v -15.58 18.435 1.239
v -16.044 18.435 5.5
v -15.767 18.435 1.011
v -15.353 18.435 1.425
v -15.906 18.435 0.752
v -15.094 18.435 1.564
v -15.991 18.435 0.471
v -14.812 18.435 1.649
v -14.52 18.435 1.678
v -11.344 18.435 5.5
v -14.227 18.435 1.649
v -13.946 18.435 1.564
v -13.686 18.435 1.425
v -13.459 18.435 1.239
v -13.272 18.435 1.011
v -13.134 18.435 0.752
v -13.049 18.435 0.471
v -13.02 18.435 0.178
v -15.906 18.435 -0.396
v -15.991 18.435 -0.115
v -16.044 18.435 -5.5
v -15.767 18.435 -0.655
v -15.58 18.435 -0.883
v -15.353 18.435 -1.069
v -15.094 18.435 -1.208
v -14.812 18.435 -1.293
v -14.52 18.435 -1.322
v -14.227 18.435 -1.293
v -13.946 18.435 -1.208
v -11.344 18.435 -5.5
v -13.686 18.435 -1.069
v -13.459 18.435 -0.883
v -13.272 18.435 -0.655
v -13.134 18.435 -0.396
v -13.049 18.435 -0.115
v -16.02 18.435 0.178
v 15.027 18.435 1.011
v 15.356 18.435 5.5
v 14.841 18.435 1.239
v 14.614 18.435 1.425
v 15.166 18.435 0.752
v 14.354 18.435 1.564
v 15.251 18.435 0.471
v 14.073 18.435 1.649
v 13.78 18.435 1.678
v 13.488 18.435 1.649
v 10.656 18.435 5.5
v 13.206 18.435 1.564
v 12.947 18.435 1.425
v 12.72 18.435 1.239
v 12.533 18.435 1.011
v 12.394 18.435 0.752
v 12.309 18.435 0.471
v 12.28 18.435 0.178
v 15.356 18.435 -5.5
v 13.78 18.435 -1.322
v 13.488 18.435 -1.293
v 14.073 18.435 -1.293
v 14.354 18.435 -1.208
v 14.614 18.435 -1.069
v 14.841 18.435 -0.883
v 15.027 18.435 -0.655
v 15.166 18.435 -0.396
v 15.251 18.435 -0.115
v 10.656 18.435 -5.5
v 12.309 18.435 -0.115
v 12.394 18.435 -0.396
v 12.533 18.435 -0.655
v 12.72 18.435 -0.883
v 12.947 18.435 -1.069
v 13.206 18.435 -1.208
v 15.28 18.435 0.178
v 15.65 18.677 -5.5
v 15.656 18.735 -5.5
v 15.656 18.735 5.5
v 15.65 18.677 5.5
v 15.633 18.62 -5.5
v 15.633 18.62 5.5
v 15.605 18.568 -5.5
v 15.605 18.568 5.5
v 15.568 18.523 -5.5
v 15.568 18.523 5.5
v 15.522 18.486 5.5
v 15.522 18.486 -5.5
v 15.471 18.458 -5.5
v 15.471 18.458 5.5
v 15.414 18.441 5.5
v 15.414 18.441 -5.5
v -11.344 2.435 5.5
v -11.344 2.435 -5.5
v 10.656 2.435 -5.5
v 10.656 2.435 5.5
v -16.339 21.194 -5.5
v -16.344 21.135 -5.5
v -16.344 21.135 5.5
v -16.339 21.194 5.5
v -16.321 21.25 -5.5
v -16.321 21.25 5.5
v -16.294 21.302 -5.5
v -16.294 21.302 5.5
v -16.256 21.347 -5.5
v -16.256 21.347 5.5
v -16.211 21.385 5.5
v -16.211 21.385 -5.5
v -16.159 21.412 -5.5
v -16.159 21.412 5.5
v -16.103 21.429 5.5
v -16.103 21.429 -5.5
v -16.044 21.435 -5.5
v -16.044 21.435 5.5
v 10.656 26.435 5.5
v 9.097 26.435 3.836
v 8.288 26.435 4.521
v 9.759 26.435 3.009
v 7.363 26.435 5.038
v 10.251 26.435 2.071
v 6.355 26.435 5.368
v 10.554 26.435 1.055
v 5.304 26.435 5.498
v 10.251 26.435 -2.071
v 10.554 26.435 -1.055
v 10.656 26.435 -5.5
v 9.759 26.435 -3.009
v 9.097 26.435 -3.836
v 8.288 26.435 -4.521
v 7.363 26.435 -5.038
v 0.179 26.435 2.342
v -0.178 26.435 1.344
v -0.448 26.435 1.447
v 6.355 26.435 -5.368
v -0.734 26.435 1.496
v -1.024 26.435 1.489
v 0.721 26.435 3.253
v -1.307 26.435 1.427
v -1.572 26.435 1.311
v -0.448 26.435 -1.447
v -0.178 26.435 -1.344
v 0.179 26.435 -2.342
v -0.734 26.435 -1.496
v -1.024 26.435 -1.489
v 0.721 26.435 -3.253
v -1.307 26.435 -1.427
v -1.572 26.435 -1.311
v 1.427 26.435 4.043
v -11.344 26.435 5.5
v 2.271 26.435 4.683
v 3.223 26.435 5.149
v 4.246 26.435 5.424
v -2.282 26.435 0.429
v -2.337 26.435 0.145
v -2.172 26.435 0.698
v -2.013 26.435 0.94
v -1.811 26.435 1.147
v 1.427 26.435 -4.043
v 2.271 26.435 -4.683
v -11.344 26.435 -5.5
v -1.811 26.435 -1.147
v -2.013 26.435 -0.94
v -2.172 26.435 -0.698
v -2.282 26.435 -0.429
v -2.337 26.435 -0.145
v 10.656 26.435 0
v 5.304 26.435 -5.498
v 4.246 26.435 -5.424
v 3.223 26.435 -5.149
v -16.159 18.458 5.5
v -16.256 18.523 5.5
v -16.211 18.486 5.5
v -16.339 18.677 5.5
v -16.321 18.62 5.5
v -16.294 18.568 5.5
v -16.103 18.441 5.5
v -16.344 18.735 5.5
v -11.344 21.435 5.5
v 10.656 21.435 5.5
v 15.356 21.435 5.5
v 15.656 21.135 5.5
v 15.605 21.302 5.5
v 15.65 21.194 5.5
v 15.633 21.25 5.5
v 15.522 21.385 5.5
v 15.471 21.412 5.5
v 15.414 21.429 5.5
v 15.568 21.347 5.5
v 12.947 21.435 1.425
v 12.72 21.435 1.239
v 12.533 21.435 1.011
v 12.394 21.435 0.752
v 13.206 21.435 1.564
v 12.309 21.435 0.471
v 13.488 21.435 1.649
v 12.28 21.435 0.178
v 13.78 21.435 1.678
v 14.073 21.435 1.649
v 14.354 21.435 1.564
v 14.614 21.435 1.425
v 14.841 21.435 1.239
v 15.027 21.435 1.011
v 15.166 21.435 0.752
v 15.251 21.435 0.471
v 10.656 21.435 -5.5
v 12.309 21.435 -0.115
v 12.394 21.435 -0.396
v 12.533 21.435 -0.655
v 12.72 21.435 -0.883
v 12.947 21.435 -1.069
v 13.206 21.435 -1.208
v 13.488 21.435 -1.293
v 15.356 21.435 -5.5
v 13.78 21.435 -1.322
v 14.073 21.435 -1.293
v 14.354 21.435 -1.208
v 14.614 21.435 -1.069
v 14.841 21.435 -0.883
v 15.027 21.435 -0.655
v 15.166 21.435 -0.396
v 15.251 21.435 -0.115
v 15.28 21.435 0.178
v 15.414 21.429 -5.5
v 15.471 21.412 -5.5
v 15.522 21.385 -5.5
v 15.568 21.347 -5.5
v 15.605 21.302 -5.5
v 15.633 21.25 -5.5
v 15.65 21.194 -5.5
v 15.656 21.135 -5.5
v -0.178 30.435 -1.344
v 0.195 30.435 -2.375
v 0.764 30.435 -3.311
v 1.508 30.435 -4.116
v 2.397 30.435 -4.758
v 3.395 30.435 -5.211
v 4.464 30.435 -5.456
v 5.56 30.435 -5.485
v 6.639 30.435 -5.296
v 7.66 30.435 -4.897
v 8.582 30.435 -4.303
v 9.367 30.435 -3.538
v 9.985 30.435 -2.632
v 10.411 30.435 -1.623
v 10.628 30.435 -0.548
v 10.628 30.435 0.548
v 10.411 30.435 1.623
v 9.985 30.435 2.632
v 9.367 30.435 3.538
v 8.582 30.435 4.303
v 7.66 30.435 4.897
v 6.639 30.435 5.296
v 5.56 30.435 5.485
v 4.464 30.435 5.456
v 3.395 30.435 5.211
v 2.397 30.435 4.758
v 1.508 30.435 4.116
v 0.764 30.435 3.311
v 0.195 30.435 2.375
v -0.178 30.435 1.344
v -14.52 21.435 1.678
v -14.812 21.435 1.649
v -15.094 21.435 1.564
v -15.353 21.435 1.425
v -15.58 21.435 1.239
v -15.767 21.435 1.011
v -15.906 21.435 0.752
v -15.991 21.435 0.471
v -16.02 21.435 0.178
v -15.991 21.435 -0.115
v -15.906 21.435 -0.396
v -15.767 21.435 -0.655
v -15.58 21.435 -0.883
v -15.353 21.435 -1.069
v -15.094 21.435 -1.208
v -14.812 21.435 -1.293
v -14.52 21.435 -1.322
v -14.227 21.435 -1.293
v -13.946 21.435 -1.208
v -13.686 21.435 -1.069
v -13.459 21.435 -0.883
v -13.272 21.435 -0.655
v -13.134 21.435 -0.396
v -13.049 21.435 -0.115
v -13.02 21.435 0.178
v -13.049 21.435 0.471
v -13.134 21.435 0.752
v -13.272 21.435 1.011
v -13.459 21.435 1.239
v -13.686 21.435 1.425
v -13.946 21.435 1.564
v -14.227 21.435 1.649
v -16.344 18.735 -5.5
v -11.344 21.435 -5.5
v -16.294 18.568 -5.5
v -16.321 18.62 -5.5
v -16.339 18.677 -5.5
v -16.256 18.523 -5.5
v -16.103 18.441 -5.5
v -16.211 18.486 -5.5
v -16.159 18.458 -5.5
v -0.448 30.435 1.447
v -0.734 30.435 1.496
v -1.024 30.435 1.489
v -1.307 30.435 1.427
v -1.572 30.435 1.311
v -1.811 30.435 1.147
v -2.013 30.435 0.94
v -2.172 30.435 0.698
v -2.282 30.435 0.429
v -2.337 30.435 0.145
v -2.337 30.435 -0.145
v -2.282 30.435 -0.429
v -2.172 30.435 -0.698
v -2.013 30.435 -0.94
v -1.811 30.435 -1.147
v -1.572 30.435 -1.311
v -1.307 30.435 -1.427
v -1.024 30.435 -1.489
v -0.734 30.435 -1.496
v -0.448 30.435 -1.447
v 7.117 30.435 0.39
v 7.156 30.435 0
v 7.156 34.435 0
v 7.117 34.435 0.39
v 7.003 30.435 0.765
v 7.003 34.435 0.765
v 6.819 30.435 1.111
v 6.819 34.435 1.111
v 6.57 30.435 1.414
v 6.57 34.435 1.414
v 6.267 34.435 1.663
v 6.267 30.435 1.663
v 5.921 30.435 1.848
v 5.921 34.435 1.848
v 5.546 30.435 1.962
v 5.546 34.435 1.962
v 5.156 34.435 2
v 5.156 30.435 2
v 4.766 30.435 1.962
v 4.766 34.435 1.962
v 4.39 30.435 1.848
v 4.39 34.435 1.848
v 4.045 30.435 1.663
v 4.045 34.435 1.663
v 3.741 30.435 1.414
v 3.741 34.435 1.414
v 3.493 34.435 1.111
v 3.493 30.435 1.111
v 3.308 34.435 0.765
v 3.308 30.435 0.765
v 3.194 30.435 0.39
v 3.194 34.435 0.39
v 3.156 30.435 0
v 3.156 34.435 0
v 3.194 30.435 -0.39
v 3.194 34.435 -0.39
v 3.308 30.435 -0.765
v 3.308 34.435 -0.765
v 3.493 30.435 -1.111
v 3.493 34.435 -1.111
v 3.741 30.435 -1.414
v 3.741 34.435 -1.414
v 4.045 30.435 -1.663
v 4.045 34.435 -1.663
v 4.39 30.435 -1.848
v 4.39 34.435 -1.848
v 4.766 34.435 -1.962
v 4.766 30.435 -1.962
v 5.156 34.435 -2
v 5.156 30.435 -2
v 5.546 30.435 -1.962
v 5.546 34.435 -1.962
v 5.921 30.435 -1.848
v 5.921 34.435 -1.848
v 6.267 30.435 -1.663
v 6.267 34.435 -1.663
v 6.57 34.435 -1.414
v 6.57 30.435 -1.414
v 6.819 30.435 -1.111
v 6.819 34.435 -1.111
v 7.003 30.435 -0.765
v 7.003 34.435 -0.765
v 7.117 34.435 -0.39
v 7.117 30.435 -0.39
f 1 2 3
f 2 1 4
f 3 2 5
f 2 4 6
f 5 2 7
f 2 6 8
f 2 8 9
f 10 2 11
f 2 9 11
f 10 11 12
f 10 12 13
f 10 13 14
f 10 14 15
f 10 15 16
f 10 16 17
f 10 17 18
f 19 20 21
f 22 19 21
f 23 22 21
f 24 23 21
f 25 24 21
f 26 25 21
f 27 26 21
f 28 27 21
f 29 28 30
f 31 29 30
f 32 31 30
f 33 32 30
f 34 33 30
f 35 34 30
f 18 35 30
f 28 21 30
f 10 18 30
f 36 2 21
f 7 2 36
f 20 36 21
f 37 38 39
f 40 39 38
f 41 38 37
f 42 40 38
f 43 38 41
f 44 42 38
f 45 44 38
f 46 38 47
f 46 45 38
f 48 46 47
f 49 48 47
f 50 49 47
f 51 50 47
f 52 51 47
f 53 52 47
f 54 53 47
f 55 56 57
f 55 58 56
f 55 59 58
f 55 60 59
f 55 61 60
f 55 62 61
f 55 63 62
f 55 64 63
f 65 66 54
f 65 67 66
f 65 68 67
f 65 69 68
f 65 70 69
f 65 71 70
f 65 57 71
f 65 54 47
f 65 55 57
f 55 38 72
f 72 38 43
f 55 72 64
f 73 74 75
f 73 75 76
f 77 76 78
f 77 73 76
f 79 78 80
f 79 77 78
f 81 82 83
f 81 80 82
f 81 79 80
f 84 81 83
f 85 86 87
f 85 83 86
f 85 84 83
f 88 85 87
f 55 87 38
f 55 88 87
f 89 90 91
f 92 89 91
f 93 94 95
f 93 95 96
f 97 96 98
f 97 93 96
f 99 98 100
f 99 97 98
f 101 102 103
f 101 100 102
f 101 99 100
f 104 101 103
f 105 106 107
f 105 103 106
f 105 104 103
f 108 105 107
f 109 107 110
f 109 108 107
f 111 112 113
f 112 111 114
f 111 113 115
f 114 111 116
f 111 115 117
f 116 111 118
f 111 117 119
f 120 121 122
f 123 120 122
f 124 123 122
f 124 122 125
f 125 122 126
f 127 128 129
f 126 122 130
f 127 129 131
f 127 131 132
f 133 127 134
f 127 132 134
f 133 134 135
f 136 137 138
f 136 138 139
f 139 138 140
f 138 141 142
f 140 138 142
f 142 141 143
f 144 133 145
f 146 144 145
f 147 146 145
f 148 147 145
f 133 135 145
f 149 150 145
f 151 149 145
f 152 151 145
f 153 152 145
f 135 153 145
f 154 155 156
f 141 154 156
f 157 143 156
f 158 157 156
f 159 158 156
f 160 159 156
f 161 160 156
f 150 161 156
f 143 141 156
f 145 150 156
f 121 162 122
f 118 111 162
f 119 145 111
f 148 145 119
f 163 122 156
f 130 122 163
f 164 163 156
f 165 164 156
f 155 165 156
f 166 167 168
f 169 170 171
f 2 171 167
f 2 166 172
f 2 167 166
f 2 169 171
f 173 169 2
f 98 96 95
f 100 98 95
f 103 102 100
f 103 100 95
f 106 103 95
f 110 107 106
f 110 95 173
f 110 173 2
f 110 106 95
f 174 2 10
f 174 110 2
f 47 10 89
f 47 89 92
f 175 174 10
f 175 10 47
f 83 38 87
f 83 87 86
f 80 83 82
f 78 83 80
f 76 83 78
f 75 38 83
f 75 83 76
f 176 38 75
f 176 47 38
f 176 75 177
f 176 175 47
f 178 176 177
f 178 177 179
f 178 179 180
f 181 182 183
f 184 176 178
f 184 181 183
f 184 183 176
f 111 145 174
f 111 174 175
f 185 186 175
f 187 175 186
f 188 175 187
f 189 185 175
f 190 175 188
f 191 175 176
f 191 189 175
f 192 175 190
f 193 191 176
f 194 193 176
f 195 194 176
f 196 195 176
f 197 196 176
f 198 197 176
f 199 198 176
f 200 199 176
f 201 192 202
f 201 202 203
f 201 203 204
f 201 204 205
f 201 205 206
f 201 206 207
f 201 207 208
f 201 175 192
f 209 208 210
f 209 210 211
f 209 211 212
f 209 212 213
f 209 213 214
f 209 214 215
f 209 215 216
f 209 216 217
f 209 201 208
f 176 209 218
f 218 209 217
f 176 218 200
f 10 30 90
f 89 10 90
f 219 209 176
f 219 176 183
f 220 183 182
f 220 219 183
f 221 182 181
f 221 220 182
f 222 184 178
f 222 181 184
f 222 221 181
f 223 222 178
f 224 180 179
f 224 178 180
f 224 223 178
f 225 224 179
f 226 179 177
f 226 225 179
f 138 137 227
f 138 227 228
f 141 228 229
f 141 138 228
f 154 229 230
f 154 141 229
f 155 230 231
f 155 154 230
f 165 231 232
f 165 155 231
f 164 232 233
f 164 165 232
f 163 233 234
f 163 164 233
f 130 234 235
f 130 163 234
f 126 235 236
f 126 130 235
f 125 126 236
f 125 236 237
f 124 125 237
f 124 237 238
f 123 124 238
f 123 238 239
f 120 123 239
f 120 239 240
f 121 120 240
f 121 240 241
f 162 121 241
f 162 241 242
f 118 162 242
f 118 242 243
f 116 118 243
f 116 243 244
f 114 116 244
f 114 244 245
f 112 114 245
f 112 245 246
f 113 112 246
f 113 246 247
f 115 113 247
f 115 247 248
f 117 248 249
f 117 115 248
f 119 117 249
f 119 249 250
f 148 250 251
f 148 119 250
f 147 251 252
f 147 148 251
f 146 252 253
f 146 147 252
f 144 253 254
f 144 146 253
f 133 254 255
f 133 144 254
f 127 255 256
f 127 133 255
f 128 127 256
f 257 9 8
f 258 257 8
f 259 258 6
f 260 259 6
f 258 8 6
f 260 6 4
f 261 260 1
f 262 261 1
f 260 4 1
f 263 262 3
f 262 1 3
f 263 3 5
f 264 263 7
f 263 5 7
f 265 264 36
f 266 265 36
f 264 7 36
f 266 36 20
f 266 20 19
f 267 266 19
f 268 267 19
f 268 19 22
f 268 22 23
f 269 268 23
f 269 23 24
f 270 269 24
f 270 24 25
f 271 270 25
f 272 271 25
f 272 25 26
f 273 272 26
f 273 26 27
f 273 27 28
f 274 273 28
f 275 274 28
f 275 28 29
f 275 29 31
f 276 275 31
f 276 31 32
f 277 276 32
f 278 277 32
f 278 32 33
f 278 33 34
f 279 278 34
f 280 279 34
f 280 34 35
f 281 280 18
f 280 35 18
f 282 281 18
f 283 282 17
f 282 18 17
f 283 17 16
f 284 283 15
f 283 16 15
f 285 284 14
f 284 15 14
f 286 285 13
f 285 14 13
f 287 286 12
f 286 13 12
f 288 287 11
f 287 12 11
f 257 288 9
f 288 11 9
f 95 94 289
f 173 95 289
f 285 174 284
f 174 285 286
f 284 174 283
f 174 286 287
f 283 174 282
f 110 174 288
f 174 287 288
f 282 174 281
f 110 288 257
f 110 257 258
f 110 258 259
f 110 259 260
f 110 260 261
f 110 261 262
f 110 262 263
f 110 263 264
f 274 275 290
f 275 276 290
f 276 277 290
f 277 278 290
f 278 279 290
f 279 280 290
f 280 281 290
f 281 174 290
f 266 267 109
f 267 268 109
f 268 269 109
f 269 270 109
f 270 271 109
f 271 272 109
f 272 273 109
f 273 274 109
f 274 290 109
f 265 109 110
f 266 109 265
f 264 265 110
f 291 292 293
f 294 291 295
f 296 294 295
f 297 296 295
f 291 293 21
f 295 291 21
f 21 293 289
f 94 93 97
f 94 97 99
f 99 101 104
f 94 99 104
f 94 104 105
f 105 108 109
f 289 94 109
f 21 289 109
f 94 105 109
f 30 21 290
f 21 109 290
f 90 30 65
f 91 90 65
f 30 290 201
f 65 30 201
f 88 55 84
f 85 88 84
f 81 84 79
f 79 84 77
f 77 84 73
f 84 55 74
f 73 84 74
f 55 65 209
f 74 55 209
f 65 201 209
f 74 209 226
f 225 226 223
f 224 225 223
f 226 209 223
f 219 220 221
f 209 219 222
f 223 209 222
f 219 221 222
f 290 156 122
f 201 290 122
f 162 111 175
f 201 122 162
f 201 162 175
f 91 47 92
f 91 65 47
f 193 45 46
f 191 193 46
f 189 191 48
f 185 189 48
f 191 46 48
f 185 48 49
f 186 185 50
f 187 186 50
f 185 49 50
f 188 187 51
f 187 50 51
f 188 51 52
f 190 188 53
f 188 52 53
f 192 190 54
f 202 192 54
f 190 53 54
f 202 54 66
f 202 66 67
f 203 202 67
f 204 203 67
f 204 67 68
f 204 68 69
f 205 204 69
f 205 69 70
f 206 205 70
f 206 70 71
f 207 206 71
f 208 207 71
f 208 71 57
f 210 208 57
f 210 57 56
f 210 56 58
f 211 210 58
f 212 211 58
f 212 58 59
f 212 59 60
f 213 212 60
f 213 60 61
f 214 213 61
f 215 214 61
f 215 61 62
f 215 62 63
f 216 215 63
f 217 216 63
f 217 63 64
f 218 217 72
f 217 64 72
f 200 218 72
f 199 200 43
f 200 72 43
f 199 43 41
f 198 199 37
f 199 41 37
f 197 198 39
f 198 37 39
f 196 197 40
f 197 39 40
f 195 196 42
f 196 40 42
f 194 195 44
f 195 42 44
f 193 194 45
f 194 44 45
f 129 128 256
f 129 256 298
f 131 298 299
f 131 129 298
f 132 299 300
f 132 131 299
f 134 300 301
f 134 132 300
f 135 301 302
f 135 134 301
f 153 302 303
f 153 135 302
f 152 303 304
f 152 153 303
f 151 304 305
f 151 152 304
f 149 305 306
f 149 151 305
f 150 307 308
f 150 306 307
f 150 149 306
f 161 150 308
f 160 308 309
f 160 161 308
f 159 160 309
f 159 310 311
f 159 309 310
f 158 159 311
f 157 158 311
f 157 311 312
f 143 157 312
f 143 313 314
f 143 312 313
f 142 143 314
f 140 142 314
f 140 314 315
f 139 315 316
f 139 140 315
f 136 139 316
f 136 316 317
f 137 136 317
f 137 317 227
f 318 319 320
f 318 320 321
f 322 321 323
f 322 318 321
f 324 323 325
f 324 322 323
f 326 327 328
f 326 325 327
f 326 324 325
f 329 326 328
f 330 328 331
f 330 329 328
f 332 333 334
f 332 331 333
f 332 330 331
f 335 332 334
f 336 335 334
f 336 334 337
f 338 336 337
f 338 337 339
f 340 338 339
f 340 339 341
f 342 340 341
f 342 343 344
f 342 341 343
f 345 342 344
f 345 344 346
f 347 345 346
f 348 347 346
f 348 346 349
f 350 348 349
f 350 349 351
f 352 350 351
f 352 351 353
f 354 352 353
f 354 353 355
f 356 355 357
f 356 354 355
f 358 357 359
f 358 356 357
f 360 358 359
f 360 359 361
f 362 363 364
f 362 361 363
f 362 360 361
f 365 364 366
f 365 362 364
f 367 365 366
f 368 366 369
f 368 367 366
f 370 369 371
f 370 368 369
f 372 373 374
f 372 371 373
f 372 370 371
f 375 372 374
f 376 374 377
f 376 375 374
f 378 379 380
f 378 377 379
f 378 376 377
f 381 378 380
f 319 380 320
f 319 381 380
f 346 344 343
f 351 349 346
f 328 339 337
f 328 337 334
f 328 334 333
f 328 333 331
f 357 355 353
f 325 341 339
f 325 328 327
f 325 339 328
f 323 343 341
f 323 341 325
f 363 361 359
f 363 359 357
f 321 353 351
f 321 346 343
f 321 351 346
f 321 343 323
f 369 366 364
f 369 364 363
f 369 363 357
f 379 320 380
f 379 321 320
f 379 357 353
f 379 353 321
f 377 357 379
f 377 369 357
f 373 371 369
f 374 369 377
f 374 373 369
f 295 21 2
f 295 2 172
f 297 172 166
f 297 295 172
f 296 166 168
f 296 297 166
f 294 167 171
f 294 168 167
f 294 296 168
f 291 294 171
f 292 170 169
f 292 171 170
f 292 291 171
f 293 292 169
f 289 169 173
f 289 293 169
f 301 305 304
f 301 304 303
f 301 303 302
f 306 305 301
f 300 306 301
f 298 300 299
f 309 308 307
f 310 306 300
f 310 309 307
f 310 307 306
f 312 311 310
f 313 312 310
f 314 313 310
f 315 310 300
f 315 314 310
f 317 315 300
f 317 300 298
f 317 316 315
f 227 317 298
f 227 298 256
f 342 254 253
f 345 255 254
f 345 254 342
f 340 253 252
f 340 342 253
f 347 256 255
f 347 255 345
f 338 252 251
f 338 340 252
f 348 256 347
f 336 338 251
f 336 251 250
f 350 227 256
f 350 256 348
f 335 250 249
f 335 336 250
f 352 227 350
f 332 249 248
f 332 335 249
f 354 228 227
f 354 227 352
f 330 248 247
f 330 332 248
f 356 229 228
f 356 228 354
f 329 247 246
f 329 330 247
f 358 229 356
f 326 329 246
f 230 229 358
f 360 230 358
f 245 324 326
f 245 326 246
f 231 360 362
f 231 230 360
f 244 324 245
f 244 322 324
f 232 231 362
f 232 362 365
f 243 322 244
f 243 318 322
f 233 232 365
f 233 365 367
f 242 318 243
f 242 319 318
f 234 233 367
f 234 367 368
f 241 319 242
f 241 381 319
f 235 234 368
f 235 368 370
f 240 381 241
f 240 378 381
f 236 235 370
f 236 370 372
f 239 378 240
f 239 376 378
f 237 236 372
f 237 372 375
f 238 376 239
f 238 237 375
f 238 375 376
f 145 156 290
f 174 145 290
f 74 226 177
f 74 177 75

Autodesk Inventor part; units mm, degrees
ref_plane "YZ Plane" through (0, 0, 0) normal (1, 0, 0) x (0, 1, 0)
ref_plane "XZ Plane" through (0, 0, 0) normal (0, 1, 0) x (-1, 0, 0)
ref_plane "XY Plane" through (0, 0, 0) normal (0, 0, 1) x (1, 0, 0)
sketch "Sketch1" plane through (0, 0, 0) normal (0, 0, 1) x (1, 0, 0)
  line L0 (-11.3443, 2.4351) -> (-0.3443, 2.4351)
  line L1 (-0.3443, 2.4351) -> (-0.3443, 26.4351)
  line L2 (-0.3443, 26.4351) -> (-11.3443, 26.4351)
  line L3 (-11.3443, 26.4351) -> (-11.3443, 2.4351)
  line L4 (-10.0022, 21.4351) -> (-10.0022, 22.9768)
  line L5 (-11.3443, 21.4351) -> (-16.0443, 21.4351)
  line L6 (-16.3443, 21.1351) -> (-16.3443, 18.7351)
  line L7 (-16.0443, 18.4351) -> (-11.3443, 18.4351)
  line L8 (10.6557, 2.4351) -> (-0.3443, 2.4351)
  line L9 (-0.3443, 26.4351) -> (10.6557, 26.4351)
  line L10 (10.6557, 26.4351) -> (10.6557, 2.4351)
  line L11 (10.6557, 21.4351) -> (15.3557, 21.4351)
  line L12 (15.6557, 21.1351) -> (15.6557, 18.7351)
  line L13 (15.3557, 18.4351) -> (10.6557, 18.4351)
  arc A0 (-16.3443, 18.7351) -> (-16.0443, 18.4351) centre (-16.0443, 18.7351) ccw
  arc A1 (-16.0443, 21.4351) -> (-16.3443, 21.1351) centre (-16.0443, 21.1351) ccw
  arc A2 (15.3557, 18.4351) -> (15.6557, 18.7351) centre (15.3557, 18.7351) ccw
  arc A3 (15.6557, 21.1351) -> (15.3557, 21.4351) centre (15.3557, 21.1351) ccw
  point P0 (0, 0)
  point P1 (-16.3443, 21.4351)
  point P2 (-16.3443, 18.4351)
  point P3 (15.6557, 21.4351)
  point P4 (15.6557, 18.4351)
  dimension "d0" = 11
  dimension "d1" = 24
  dimension "d3" = 5
  dimension "d4" = 3
  dimension "d5" = 0.3
extrude "Extrusion1" add sketch "Sketch1" along normal mid plane 11
sketch "Sketch2" plane through (-11.3443, 26.4351, 5.5) normal (0, 1, 0) x (1, 0, 0)
  line L0 (22, 11) -> (22, 0) projected
  arc A0 (11.1667, 4.1563) -> (11.1667, 6.8437) centre (16.5, 5.5) ccw
  arc A1 (11.1667, 6.8437) -> (11.1667, 4.1563) centre (10.5, 5.5) ccw
  point P0 (11.3443, 5.5)
  dimension "d9" = 11
  dimension "d11" = 3
extrude "Extrusion2" add sketch "Sketch2" along normal blind 4
sketch "Sketch3" plane through (-11.3443, 30.4351, 5.5) normal (0, 1, 0) x (1, 0, 0)
  line L0 (22, 11) -> (22, 5.5) projected
  circle A0 centre (16.5, 5.5) radius 2
  point P0 (11.3443, 5.5)
extrude "Extrusion3" add sketch "Sketch3" along normal blind 4
sketch "Sketch4" plane through (-16.0443, 21.4351, 5.5) normal (0, 1, 0) x (1, 0, 0)
  point P0 (16.0443, 5.5)
  point P1 (1.5246, 5.3219)
  point P2 (29.8245, 5.3219)
hole "Hole1" at (13.7802, 21.4351, 0.1781) at (-14.5197, 21.4351, 0.1781) direction (0, -1, 0) diameter 3 end through all
equation "\"BendRadius\" = Thickness"
equation "\"BendReliefWidth\" = Thickness"
equation "\"BendReliefDepth\" = 0.5 * Thickness"
equation "\"CornerReliefSize\" = 4 * Thickness"
equation "\"MinimumRemnant\" = 2 * Thickness"
equation "\"TransitionRadius\" = BendRadius"
equation "\"JacobiRadiusSize\" = Thickness"
equation "\"GapSize\" = Thickness"
equation "\"Thickness\" = 0.5"
properties part number "servo1" material "PBT Plastic"
